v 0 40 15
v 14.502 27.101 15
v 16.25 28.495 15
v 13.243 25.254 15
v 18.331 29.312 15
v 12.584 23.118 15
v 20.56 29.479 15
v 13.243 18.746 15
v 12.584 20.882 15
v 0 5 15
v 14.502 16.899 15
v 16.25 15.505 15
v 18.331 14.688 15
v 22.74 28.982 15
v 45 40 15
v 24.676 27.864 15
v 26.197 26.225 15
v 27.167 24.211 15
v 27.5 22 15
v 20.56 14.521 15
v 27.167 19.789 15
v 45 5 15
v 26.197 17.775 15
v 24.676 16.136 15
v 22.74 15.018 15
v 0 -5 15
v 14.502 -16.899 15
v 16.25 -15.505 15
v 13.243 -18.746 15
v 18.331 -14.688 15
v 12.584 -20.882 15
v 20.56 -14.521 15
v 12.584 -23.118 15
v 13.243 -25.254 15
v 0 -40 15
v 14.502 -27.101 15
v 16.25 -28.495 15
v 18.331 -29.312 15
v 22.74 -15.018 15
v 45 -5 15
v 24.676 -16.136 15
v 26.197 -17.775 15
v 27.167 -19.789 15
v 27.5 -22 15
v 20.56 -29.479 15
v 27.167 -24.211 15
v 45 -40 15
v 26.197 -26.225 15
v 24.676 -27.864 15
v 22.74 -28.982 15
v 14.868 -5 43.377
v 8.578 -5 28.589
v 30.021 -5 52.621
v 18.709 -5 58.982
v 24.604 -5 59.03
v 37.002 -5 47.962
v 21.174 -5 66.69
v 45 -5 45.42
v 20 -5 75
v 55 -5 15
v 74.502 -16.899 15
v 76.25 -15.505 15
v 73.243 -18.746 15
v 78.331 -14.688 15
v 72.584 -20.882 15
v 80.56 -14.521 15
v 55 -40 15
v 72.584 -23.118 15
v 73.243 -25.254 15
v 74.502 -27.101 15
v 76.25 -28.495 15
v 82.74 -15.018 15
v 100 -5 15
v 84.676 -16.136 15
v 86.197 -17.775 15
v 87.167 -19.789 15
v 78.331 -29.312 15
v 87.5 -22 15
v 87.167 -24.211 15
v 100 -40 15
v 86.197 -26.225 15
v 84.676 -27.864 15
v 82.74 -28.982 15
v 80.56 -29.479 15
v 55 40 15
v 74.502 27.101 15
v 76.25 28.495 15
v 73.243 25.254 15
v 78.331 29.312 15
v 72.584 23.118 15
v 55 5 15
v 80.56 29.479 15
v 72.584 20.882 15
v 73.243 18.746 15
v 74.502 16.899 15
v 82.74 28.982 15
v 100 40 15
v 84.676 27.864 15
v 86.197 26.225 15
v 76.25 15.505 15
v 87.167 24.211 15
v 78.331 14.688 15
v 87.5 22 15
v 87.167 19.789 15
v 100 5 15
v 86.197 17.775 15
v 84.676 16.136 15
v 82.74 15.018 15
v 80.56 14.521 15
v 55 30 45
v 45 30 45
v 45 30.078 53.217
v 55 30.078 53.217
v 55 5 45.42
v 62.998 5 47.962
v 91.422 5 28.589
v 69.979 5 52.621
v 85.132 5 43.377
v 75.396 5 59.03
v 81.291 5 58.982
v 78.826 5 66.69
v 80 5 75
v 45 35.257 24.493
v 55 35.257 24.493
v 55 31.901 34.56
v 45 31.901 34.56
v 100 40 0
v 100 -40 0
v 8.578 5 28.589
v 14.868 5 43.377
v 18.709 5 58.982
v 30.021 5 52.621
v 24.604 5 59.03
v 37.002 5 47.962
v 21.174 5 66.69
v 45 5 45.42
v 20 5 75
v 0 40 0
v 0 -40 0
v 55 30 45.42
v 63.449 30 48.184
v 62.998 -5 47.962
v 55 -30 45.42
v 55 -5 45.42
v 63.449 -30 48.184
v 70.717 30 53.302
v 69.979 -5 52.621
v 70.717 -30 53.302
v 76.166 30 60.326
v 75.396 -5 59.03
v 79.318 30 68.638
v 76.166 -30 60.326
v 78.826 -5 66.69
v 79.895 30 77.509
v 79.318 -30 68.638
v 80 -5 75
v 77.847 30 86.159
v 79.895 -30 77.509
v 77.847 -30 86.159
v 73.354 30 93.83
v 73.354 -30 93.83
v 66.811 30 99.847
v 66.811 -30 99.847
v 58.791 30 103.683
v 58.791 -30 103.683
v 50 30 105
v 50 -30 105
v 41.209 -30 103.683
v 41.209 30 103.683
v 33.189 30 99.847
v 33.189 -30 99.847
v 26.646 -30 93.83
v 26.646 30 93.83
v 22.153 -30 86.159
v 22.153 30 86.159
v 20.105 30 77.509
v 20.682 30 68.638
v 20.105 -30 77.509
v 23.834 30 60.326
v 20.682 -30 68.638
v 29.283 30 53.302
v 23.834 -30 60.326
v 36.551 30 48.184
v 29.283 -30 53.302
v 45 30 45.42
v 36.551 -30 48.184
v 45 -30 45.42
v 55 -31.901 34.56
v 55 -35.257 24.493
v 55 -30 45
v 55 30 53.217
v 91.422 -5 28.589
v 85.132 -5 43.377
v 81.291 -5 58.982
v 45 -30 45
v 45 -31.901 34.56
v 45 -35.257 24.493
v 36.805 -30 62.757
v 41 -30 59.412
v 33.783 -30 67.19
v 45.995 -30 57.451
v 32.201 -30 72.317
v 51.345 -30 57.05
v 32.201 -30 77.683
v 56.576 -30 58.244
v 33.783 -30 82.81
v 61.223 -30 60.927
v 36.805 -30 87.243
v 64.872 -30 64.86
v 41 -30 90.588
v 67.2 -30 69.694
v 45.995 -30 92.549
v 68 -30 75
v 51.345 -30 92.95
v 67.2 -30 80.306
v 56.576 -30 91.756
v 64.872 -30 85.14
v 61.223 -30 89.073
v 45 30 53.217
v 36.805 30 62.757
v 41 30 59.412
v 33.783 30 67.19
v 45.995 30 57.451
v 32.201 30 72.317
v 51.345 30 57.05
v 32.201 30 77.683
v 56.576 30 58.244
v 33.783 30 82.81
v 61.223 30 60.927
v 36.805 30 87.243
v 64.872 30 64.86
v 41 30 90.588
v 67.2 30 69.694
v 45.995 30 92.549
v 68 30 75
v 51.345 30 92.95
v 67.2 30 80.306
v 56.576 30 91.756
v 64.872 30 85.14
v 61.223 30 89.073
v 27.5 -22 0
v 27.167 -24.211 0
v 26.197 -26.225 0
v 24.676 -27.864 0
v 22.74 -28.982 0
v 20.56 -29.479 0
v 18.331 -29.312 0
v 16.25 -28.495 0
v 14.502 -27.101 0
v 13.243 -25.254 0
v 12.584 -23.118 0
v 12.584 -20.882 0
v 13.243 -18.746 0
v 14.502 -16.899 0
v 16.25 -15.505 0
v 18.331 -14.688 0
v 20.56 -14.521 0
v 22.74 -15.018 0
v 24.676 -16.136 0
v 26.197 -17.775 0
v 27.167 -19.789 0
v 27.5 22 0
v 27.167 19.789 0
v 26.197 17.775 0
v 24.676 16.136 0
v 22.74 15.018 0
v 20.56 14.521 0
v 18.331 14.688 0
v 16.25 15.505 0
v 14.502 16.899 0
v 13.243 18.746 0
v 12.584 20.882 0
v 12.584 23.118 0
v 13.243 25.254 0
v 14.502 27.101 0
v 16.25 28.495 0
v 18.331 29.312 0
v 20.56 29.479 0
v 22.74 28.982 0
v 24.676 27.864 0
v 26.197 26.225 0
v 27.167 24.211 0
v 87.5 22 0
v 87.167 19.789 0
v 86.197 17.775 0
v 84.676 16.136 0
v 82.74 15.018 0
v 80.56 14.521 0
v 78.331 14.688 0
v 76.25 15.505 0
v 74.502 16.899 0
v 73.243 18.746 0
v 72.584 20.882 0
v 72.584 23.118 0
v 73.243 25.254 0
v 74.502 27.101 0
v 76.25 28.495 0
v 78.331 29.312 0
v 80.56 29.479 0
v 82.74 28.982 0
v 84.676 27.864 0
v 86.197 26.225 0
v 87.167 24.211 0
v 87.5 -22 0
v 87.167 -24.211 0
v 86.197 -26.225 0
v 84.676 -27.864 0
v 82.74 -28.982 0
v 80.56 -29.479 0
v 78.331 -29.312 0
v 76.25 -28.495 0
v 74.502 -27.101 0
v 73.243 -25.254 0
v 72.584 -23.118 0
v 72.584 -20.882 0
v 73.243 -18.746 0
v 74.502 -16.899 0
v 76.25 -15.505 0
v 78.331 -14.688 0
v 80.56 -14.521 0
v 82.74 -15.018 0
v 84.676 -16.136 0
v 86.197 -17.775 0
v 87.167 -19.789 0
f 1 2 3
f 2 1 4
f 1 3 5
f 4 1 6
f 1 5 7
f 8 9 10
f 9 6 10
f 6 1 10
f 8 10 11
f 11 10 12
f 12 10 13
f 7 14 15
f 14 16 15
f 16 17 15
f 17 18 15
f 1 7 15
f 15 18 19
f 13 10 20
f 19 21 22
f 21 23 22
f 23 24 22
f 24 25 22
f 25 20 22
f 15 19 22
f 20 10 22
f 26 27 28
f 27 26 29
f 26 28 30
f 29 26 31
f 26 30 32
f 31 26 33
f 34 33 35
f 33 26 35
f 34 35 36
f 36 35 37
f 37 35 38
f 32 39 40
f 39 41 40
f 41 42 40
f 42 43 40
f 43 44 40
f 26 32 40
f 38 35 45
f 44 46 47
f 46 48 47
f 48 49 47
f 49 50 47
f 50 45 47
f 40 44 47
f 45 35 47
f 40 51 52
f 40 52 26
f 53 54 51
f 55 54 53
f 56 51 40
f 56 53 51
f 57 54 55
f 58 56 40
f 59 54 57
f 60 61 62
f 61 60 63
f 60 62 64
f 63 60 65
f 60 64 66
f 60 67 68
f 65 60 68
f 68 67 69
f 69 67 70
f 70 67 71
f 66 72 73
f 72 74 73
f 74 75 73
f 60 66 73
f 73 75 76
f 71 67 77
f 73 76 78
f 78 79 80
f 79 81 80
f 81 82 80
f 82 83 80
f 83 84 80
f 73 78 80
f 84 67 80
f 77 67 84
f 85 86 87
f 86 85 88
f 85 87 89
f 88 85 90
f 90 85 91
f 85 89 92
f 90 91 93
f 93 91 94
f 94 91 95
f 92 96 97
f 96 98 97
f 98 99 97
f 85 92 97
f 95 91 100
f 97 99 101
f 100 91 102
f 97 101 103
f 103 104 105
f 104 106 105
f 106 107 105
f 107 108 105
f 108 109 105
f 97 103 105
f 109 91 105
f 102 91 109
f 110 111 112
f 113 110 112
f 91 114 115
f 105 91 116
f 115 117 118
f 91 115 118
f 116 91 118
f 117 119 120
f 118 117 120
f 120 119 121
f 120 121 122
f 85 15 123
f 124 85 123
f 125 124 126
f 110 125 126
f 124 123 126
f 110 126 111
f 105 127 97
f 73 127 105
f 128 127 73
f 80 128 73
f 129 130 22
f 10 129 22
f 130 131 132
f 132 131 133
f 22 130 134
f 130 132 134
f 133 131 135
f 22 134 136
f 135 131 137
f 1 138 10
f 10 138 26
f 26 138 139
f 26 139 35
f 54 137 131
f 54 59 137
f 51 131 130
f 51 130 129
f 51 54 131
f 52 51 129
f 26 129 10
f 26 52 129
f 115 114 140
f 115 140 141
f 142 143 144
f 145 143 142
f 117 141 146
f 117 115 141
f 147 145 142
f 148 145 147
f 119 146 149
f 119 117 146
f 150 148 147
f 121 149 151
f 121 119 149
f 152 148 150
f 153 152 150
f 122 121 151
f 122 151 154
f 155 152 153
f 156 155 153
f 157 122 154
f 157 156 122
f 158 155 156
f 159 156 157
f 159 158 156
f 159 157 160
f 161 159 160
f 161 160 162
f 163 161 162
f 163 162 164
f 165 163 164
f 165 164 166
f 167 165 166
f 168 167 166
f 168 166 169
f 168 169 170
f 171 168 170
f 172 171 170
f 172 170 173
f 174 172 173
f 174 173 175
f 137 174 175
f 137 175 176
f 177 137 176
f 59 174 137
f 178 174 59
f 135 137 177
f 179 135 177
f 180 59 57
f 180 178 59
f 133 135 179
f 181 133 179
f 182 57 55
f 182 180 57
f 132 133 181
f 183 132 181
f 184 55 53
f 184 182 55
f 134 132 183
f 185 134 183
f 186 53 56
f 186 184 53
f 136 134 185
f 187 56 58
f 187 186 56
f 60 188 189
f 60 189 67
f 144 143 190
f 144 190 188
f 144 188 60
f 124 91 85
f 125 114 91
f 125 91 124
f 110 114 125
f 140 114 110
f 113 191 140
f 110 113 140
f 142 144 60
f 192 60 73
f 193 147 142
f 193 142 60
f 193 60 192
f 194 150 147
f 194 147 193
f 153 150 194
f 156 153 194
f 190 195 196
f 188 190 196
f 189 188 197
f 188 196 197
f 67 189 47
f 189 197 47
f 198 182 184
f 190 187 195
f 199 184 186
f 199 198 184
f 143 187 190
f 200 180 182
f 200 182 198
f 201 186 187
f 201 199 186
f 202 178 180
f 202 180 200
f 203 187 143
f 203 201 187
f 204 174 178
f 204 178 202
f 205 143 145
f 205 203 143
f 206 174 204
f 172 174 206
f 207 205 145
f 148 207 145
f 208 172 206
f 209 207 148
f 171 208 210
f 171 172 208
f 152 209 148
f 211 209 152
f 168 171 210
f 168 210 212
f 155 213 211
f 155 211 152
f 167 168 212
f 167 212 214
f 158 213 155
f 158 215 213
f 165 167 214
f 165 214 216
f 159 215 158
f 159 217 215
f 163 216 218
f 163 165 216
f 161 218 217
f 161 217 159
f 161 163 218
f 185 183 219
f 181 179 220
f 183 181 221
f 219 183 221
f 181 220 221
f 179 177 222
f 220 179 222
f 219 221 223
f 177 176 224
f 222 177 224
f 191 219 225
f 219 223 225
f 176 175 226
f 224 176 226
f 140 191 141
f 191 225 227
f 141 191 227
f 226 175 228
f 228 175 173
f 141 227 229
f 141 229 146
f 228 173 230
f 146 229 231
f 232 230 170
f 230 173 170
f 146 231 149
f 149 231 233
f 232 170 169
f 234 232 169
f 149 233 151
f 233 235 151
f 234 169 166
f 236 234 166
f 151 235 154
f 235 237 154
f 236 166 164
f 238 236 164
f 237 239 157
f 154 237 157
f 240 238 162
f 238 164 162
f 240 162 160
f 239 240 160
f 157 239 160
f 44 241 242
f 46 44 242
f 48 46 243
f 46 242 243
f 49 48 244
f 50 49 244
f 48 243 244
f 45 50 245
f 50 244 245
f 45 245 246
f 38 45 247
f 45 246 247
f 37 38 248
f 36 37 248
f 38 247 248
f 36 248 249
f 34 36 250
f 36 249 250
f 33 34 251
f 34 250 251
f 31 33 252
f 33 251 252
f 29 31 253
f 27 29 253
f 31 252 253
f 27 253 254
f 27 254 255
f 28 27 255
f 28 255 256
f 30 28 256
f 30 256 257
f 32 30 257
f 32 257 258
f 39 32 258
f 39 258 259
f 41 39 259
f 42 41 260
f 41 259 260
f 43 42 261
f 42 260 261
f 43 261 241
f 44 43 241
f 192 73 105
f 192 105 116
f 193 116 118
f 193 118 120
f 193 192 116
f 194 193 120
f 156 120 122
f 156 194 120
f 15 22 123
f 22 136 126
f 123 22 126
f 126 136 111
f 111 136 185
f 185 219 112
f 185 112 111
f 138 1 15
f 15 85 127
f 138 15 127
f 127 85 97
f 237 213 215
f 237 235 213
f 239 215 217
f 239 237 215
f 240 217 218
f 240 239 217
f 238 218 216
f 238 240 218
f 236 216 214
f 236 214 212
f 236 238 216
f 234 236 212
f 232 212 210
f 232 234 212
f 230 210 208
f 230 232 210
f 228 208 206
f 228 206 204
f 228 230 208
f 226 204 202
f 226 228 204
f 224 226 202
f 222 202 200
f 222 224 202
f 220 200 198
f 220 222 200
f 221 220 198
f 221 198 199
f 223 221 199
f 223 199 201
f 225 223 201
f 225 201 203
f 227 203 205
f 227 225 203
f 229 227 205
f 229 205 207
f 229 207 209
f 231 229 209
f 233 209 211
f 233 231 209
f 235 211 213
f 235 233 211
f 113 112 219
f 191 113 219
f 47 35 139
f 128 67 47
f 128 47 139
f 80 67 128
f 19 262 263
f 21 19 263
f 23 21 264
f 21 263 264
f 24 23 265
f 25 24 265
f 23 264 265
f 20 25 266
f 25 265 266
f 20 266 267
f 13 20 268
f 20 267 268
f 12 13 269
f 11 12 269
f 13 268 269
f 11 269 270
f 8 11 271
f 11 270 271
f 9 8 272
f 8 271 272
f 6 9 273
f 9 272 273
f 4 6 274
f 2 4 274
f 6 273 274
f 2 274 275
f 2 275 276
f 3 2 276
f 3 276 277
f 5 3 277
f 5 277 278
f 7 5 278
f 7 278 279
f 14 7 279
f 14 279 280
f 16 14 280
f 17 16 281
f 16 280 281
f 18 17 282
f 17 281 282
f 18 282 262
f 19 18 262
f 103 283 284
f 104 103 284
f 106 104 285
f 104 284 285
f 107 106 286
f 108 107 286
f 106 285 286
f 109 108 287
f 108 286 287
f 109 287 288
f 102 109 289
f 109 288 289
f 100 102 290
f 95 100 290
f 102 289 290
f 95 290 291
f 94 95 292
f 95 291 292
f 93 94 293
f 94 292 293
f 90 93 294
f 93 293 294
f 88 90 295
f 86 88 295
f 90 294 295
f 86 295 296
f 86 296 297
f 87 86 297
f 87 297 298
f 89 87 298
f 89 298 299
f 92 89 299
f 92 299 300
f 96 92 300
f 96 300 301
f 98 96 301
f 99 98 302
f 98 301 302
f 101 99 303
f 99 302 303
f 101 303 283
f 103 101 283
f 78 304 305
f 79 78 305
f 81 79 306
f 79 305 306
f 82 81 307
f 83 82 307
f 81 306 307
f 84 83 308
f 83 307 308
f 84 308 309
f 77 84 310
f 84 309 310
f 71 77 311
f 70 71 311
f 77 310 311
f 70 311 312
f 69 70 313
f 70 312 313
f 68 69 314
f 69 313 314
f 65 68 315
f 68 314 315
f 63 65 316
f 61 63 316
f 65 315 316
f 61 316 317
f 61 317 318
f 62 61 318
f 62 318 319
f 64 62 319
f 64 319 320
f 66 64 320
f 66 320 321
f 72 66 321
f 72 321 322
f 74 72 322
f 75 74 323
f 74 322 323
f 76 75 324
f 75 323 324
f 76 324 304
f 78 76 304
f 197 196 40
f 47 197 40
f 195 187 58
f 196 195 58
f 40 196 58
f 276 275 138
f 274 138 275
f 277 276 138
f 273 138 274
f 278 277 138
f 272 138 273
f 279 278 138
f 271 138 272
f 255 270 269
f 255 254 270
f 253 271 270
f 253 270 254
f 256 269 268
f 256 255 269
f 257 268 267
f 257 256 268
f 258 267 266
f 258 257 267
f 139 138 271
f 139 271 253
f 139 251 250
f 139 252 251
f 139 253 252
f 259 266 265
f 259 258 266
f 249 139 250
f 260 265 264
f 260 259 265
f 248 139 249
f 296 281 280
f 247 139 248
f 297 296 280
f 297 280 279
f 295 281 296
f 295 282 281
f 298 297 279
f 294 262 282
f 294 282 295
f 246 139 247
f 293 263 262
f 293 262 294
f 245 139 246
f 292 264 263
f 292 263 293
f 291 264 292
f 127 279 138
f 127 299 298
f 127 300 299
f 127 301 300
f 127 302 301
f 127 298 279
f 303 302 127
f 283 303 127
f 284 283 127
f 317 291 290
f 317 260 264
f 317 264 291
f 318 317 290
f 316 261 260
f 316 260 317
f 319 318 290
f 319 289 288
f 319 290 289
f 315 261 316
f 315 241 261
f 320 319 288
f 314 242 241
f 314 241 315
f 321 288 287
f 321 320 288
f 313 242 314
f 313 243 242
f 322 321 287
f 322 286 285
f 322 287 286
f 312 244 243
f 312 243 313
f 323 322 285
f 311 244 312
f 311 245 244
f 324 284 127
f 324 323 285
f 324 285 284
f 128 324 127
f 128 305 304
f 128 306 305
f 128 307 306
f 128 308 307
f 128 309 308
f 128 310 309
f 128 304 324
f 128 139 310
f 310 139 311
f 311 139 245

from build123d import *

# Parameters (mm, degrees)
F0_W     = 100
F0_H     = 15
F1_DEPTH = 40
F0_R     = 18
F2_DEPTH = 30
F3_DEPTH = 5
F6_DEPTH = 10
F7_R     = 7.5
F8_DEPTH = 15


with BuildPart() as f1:
    # F0 (on Front) → F1 (new body, symmetric)
    with BuildSketch(Plane.XZ):
        with Locations((50, 7.5)):
            Rectangle(F0_W, F0_H)
    extrude(amount=F1_DEPTH, both=True)



with BuildPart() as f2:
    # F0 (on Front) → F2 (new body, symmetric)
    with BuildSketch(Plane.XZ):
        with BuildLine():
            ThreePointArc((80, 75), (50, 105), (20, 75))
            ThreePointArc((20, 75), (50, 45), (80, 75))
        make_face()
        with Locations((50, 75)):
            Circle(F0_R, mode=Mode.SUBTRACT)
    extrude(amount=F2_DEPTH, both=True)


with BuildPart() as f1_1:
    add(f1.part)

    add(f2.part)  # F3 merges F2
    # F0 (on Front) → F3 (join, symmetric)
    with BuildSketch(Plane.XZ):
        with BuildLine():
            ThreePointArc((20, 75), (14.86833, 43.377223), (0, 15))
            Line((0, 15), (100, 15))
            ThreePointArc((100, 15), (85.13167, 43.377223), (80, 75))
            ThreePointArc((80, 75), (50, 45), (20, 75))
        make_face()
    extrude(amount=F3_DEPTH, both=True)

    # F5 (on offset) → F6 (join)
    with BuildSketch(Plane.YZ.offset(45)):
        with BuildLine():
            ThreePointArc((40, 15), (33.400891, 29.466964), (30, 45))
            Line((30, 45), (30.077839, 53.216796))
            Line((30.077839, 53.216796), (-30, 53.216796))
            Line((-30, 53.216796), (-30, 45))
            ThreePointArc((-30, 45), (-33.400891, 29.466964), (-40, 15))
            Line((-40, 15), (-5, 15))
            Line((-5, 15), (5, 15))
            Line((5, 15), (40, 15))
        make_face()
    extrude(amount=F6_DEPTH)

    # F7 (on face) → F8 (cut, through all)
    with BuildSketch(Plane(origin=(0, 0, 0), x_dir=(1, 0, 0), z_dir=(0, 0, -1))):
        with Locations((80, -22)):
            Circle(F7_R)
        with Locations((20, -22)):
            Circle(F7_R)
        with Locations((80, 22)):
            Circle(F7_R)
        with Locations((20, 22)):
            Circle(F7_R)
    extrude(amount=-F8_DEPTH, mode=Mode.SUBTRACT)


solid = f1_1.part
